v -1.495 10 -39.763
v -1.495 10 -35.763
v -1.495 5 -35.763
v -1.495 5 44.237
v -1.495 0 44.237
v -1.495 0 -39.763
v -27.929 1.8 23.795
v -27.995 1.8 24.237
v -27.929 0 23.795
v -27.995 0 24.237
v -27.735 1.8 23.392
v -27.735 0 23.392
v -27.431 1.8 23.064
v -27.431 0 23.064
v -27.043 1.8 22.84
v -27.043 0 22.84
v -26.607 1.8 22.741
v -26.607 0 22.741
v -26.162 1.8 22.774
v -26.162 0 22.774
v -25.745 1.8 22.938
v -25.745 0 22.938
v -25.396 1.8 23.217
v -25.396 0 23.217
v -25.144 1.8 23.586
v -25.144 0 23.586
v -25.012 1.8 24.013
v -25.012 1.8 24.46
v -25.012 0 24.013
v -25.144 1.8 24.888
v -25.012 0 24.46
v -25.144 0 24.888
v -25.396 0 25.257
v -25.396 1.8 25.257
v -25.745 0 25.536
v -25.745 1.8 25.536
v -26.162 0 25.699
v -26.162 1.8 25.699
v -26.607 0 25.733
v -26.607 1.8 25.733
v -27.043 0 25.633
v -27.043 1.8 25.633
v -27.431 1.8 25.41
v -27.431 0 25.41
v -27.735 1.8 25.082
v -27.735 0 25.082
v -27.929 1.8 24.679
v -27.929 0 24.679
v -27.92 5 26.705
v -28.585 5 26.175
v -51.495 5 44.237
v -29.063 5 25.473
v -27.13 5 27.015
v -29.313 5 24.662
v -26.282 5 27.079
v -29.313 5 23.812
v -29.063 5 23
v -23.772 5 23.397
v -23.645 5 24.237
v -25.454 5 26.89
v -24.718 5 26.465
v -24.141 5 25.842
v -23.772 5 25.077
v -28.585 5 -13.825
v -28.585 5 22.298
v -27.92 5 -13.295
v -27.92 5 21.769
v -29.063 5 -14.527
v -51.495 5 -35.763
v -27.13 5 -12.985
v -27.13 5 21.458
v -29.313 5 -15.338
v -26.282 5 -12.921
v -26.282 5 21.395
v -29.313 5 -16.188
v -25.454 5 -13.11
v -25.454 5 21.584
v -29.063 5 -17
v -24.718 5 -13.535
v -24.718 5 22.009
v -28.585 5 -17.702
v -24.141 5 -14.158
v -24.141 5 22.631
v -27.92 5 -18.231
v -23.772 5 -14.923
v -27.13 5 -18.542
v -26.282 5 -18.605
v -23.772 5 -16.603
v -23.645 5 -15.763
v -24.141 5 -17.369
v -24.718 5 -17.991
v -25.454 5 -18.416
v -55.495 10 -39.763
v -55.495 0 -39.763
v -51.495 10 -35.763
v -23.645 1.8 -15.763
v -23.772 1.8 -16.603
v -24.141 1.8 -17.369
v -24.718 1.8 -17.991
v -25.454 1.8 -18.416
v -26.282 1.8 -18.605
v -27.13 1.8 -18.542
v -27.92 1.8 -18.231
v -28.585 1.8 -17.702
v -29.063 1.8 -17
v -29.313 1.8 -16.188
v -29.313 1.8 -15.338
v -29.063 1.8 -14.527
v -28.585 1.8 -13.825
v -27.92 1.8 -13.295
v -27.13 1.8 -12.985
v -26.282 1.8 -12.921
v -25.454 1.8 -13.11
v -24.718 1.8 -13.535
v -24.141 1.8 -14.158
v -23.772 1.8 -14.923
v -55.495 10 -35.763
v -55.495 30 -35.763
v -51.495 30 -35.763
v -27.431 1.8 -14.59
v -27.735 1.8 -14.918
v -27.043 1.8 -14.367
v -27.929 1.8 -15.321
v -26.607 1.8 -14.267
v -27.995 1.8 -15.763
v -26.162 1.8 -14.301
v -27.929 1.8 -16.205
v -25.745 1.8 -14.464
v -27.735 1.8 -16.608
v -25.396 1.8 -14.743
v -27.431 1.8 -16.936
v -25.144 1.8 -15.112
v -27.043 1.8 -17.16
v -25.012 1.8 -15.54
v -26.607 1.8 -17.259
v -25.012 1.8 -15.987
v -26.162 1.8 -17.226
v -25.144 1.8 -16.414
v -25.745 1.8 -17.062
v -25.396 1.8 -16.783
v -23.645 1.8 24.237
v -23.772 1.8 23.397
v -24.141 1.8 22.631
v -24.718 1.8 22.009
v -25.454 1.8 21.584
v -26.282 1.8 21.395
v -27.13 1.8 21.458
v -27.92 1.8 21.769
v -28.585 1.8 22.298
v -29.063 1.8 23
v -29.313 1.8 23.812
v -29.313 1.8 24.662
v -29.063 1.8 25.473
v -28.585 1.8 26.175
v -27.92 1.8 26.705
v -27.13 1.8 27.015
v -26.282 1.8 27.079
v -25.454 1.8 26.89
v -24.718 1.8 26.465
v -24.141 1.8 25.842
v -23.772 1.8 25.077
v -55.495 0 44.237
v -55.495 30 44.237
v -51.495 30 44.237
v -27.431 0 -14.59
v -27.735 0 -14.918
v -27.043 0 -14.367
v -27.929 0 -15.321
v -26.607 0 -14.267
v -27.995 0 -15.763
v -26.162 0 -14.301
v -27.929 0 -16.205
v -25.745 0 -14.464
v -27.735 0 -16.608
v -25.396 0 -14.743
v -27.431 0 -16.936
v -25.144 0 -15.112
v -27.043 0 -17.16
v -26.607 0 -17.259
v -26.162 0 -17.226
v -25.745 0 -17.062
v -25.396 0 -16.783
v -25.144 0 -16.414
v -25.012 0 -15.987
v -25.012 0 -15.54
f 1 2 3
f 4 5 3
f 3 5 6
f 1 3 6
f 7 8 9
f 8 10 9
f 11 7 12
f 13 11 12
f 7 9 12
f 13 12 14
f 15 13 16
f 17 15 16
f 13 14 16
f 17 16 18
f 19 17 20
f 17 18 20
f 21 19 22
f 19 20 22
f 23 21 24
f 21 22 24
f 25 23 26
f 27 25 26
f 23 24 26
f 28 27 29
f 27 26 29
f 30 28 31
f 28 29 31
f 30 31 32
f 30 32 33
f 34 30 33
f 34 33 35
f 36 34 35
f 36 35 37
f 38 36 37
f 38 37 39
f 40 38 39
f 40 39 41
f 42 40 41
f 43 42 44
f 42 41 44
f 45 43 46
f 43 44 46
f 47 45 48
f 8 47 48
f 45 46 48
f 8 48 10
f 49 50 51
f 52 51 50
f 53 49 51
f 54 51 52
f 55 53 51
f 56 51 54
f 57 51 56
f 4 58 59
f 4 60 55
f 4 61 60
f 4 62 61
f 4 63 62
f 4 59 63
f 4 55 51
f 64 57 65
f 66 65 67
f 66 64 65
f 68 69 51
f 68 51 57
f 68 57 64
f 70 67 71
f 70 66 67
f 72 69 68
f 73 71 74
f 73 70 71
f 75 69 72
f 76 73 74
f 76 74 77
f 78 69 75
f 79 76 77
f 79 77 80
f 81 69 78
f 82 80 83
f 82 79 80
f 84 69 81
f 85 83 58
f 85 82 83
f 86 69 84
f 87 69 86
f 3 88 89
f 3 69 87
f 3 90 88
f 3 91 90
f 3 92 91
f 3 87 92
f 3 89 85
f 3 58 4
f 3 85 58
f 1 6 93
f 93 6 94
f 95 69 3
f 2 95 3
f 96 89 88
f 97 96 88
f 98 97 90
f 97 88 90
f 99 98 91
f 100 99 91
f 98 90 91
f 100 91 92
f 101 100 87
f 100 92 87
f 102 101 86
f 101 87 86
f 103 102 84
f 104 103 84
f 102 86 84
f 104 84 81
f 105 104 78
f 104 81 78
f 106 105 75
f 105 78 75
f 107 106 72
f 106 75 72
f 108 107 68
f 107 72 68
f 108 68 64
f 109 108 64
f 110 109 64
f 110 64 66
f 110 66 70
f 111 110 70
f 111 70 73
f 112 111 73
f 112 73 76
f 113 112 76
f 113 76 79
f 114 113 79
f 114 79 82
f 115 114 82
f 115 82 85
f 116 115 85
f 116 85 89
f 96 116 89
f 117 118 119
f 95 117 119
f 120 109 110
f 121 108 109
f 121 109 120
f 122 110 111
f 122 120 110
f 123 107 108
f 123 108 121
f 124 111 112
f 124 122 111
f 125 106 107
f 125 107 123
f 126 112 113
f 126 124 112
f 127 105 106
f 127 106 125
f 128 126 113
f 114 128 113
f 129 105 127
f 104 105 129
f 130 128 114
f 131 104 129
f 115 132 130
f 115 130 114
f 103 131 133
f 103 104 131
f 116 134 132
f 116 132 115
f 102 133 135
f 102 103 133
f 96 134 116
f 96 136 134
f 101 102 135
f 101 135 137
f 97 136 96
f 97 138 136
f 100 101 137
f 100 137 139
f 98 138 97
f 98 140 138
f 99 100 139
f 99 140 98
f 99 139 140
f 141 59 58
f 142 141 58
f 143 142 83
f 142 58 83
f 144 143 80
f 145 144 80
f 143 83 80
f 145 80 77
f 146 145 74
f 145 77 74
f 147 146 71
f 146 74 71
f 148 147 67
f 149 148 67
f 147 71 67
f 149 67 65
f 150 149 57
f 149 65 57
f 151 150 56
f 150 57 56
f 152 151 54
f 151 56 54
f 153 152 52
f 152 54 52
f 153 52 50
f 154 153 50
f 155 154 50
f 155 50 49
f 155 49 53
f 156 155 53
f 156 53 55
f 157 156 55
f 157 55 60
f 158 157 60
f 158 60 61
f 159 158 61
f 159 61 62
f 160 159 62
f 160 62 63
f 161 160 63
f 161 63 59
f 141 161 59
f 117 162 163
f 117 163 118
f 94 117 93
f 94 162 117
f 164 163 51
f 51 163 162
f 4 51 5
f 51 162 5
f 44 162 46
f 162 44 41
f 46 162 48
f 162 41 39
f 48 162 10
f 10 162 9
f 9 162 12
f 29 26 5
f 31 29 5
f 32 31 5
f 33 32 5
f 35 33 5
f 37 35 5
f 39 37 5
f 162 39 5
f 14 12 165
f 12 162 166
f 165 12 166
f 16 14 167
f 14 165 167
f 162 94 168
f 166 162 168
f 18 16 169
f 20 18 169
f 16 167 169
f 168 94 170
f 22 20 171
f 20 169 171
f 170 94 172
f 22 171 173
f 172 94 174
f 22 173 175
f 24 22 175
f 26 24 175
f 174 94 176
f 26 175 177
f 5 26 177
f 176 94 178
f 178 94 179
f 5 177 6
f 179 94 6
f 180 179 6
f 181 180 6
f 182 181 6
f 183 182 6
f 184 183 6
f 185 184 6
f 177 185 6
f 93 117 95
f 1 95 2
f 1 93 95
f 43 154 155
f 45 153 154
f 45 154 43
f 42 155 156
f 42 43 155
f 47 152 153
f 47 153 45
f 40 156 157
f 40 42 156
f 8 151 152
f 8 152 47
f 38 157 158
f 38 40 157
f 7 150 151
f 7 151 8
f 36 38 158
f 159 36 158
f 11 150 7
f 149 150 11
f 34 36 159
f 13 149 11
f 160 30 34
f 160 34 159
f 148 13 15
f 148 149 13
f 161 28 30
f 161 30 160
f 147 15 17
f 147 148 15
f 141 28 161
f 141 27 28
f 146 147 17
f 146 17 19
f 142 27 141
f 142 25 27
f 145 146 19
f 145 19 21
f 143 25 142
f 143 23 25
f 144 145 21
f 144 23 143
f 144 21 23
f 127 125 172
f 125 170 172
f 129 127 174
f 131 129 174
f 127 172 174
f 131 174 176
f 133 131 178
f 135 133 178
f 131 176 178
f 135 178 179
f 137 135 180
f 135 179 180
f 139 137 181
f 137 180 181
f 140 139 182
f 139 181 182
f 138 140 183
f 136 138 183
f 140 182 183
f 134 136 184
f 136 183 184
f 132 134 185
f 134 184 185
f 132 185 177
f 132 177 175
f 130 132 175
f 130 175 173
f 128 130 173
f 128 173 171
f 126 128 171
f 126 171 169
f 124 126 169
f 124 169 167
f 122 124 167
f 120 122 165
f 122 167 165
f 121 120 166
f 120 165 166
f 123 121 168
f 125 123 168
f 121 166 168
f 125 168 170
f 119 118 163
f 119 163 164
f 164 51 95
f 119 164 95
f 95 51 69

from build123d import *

# Parameters (mm, degrees)
SKETCH1_W                               = 50
SKETCH1_H                               = 80
BOSS_EXTRUDE1_DEPTH                     = 5
BOSS_EXTRUDE2_DEPTH                     = 10
SKETCH1_4_W                             = 4
SKETCH1_4_H                             = 80
BOSS_EXTRUDE3_DEPTH                     = 30
CBORE_FOR_M5_HEX_HEAD_BOLT1_D           = 3
CBORE_FOR_M5_HEX_HEAD_BOLT1_CBORE_D     = 5.7
CBORE_FOR_M5_HEX_HEAD_BOLT1_CBORE_DEPTH = 3.2


with BuildPart() as part:
    # Sketch1 → Boss-Extrude1 (new body)
    with BuildSketch(Plane(origin=(0, 0, 0), x_dir=(1, 0, 0), z_dir=(0, 1, 0))):
        with Locations((-26.495327103, -4.236760125)):
            Rectangle(SKETCH1_W, SKETCH1_H)
    extrude(amount=BOSS_EXTRUDE1_DEPTH)

    # Sketch1<3> → Boss-Extrude2 (add)
    with BuildSketch(Plane(origin=(0, 0, 0), x_dir=(1, 0, 0), z_dir=(0, 1, 0))):
        Polygon((-55.495327103, 35.763239875), (-51.495327103, 35.763239875), (-1.495327103, 35.763239875), (-1.495327103, 39.763239875), (-55.495327103, 39.763239875), align=None)
    extrude(amount=BOSS_EXTRUDE2_DEPTH)

    # Sketch1<4> → Boss-Extrude3 (add)
    with BuildSketch(Plane(origin=(0, 0, 0), x_dir=(1, 0, 0), z_dir=(0, 1, 0))):
        with Locations((-53.495327103, -4.236760125)):
            Rectangle(SKETCH1_4_W, SKETCH1_4_H)
    extrude(amount=BOSS_EXTRUDE3_DEPTH)

    # CBORE for M5 Hex Head Bolt1 (through all)
    with Locations(Plane(origin=(-25.6653615, 5, -85), x_dir=(1, 0, 0), z_dir=(0, 1, 0))):
        with Locations((-0.829965603, -69.236760125), (-0.829965603, -109.236760125)):
            CounterBoreHole(CBORE_FOR_M5_HEX_HEAD_BOLT1_D / 2, CBORE_FOR_M5_HEX_HEAD_BOLT1_CBORE_D / 2, CBORE_FOR_M5_HEX_HEAD_BOLT1_CBORE_DEPTH)


solid = part.part
